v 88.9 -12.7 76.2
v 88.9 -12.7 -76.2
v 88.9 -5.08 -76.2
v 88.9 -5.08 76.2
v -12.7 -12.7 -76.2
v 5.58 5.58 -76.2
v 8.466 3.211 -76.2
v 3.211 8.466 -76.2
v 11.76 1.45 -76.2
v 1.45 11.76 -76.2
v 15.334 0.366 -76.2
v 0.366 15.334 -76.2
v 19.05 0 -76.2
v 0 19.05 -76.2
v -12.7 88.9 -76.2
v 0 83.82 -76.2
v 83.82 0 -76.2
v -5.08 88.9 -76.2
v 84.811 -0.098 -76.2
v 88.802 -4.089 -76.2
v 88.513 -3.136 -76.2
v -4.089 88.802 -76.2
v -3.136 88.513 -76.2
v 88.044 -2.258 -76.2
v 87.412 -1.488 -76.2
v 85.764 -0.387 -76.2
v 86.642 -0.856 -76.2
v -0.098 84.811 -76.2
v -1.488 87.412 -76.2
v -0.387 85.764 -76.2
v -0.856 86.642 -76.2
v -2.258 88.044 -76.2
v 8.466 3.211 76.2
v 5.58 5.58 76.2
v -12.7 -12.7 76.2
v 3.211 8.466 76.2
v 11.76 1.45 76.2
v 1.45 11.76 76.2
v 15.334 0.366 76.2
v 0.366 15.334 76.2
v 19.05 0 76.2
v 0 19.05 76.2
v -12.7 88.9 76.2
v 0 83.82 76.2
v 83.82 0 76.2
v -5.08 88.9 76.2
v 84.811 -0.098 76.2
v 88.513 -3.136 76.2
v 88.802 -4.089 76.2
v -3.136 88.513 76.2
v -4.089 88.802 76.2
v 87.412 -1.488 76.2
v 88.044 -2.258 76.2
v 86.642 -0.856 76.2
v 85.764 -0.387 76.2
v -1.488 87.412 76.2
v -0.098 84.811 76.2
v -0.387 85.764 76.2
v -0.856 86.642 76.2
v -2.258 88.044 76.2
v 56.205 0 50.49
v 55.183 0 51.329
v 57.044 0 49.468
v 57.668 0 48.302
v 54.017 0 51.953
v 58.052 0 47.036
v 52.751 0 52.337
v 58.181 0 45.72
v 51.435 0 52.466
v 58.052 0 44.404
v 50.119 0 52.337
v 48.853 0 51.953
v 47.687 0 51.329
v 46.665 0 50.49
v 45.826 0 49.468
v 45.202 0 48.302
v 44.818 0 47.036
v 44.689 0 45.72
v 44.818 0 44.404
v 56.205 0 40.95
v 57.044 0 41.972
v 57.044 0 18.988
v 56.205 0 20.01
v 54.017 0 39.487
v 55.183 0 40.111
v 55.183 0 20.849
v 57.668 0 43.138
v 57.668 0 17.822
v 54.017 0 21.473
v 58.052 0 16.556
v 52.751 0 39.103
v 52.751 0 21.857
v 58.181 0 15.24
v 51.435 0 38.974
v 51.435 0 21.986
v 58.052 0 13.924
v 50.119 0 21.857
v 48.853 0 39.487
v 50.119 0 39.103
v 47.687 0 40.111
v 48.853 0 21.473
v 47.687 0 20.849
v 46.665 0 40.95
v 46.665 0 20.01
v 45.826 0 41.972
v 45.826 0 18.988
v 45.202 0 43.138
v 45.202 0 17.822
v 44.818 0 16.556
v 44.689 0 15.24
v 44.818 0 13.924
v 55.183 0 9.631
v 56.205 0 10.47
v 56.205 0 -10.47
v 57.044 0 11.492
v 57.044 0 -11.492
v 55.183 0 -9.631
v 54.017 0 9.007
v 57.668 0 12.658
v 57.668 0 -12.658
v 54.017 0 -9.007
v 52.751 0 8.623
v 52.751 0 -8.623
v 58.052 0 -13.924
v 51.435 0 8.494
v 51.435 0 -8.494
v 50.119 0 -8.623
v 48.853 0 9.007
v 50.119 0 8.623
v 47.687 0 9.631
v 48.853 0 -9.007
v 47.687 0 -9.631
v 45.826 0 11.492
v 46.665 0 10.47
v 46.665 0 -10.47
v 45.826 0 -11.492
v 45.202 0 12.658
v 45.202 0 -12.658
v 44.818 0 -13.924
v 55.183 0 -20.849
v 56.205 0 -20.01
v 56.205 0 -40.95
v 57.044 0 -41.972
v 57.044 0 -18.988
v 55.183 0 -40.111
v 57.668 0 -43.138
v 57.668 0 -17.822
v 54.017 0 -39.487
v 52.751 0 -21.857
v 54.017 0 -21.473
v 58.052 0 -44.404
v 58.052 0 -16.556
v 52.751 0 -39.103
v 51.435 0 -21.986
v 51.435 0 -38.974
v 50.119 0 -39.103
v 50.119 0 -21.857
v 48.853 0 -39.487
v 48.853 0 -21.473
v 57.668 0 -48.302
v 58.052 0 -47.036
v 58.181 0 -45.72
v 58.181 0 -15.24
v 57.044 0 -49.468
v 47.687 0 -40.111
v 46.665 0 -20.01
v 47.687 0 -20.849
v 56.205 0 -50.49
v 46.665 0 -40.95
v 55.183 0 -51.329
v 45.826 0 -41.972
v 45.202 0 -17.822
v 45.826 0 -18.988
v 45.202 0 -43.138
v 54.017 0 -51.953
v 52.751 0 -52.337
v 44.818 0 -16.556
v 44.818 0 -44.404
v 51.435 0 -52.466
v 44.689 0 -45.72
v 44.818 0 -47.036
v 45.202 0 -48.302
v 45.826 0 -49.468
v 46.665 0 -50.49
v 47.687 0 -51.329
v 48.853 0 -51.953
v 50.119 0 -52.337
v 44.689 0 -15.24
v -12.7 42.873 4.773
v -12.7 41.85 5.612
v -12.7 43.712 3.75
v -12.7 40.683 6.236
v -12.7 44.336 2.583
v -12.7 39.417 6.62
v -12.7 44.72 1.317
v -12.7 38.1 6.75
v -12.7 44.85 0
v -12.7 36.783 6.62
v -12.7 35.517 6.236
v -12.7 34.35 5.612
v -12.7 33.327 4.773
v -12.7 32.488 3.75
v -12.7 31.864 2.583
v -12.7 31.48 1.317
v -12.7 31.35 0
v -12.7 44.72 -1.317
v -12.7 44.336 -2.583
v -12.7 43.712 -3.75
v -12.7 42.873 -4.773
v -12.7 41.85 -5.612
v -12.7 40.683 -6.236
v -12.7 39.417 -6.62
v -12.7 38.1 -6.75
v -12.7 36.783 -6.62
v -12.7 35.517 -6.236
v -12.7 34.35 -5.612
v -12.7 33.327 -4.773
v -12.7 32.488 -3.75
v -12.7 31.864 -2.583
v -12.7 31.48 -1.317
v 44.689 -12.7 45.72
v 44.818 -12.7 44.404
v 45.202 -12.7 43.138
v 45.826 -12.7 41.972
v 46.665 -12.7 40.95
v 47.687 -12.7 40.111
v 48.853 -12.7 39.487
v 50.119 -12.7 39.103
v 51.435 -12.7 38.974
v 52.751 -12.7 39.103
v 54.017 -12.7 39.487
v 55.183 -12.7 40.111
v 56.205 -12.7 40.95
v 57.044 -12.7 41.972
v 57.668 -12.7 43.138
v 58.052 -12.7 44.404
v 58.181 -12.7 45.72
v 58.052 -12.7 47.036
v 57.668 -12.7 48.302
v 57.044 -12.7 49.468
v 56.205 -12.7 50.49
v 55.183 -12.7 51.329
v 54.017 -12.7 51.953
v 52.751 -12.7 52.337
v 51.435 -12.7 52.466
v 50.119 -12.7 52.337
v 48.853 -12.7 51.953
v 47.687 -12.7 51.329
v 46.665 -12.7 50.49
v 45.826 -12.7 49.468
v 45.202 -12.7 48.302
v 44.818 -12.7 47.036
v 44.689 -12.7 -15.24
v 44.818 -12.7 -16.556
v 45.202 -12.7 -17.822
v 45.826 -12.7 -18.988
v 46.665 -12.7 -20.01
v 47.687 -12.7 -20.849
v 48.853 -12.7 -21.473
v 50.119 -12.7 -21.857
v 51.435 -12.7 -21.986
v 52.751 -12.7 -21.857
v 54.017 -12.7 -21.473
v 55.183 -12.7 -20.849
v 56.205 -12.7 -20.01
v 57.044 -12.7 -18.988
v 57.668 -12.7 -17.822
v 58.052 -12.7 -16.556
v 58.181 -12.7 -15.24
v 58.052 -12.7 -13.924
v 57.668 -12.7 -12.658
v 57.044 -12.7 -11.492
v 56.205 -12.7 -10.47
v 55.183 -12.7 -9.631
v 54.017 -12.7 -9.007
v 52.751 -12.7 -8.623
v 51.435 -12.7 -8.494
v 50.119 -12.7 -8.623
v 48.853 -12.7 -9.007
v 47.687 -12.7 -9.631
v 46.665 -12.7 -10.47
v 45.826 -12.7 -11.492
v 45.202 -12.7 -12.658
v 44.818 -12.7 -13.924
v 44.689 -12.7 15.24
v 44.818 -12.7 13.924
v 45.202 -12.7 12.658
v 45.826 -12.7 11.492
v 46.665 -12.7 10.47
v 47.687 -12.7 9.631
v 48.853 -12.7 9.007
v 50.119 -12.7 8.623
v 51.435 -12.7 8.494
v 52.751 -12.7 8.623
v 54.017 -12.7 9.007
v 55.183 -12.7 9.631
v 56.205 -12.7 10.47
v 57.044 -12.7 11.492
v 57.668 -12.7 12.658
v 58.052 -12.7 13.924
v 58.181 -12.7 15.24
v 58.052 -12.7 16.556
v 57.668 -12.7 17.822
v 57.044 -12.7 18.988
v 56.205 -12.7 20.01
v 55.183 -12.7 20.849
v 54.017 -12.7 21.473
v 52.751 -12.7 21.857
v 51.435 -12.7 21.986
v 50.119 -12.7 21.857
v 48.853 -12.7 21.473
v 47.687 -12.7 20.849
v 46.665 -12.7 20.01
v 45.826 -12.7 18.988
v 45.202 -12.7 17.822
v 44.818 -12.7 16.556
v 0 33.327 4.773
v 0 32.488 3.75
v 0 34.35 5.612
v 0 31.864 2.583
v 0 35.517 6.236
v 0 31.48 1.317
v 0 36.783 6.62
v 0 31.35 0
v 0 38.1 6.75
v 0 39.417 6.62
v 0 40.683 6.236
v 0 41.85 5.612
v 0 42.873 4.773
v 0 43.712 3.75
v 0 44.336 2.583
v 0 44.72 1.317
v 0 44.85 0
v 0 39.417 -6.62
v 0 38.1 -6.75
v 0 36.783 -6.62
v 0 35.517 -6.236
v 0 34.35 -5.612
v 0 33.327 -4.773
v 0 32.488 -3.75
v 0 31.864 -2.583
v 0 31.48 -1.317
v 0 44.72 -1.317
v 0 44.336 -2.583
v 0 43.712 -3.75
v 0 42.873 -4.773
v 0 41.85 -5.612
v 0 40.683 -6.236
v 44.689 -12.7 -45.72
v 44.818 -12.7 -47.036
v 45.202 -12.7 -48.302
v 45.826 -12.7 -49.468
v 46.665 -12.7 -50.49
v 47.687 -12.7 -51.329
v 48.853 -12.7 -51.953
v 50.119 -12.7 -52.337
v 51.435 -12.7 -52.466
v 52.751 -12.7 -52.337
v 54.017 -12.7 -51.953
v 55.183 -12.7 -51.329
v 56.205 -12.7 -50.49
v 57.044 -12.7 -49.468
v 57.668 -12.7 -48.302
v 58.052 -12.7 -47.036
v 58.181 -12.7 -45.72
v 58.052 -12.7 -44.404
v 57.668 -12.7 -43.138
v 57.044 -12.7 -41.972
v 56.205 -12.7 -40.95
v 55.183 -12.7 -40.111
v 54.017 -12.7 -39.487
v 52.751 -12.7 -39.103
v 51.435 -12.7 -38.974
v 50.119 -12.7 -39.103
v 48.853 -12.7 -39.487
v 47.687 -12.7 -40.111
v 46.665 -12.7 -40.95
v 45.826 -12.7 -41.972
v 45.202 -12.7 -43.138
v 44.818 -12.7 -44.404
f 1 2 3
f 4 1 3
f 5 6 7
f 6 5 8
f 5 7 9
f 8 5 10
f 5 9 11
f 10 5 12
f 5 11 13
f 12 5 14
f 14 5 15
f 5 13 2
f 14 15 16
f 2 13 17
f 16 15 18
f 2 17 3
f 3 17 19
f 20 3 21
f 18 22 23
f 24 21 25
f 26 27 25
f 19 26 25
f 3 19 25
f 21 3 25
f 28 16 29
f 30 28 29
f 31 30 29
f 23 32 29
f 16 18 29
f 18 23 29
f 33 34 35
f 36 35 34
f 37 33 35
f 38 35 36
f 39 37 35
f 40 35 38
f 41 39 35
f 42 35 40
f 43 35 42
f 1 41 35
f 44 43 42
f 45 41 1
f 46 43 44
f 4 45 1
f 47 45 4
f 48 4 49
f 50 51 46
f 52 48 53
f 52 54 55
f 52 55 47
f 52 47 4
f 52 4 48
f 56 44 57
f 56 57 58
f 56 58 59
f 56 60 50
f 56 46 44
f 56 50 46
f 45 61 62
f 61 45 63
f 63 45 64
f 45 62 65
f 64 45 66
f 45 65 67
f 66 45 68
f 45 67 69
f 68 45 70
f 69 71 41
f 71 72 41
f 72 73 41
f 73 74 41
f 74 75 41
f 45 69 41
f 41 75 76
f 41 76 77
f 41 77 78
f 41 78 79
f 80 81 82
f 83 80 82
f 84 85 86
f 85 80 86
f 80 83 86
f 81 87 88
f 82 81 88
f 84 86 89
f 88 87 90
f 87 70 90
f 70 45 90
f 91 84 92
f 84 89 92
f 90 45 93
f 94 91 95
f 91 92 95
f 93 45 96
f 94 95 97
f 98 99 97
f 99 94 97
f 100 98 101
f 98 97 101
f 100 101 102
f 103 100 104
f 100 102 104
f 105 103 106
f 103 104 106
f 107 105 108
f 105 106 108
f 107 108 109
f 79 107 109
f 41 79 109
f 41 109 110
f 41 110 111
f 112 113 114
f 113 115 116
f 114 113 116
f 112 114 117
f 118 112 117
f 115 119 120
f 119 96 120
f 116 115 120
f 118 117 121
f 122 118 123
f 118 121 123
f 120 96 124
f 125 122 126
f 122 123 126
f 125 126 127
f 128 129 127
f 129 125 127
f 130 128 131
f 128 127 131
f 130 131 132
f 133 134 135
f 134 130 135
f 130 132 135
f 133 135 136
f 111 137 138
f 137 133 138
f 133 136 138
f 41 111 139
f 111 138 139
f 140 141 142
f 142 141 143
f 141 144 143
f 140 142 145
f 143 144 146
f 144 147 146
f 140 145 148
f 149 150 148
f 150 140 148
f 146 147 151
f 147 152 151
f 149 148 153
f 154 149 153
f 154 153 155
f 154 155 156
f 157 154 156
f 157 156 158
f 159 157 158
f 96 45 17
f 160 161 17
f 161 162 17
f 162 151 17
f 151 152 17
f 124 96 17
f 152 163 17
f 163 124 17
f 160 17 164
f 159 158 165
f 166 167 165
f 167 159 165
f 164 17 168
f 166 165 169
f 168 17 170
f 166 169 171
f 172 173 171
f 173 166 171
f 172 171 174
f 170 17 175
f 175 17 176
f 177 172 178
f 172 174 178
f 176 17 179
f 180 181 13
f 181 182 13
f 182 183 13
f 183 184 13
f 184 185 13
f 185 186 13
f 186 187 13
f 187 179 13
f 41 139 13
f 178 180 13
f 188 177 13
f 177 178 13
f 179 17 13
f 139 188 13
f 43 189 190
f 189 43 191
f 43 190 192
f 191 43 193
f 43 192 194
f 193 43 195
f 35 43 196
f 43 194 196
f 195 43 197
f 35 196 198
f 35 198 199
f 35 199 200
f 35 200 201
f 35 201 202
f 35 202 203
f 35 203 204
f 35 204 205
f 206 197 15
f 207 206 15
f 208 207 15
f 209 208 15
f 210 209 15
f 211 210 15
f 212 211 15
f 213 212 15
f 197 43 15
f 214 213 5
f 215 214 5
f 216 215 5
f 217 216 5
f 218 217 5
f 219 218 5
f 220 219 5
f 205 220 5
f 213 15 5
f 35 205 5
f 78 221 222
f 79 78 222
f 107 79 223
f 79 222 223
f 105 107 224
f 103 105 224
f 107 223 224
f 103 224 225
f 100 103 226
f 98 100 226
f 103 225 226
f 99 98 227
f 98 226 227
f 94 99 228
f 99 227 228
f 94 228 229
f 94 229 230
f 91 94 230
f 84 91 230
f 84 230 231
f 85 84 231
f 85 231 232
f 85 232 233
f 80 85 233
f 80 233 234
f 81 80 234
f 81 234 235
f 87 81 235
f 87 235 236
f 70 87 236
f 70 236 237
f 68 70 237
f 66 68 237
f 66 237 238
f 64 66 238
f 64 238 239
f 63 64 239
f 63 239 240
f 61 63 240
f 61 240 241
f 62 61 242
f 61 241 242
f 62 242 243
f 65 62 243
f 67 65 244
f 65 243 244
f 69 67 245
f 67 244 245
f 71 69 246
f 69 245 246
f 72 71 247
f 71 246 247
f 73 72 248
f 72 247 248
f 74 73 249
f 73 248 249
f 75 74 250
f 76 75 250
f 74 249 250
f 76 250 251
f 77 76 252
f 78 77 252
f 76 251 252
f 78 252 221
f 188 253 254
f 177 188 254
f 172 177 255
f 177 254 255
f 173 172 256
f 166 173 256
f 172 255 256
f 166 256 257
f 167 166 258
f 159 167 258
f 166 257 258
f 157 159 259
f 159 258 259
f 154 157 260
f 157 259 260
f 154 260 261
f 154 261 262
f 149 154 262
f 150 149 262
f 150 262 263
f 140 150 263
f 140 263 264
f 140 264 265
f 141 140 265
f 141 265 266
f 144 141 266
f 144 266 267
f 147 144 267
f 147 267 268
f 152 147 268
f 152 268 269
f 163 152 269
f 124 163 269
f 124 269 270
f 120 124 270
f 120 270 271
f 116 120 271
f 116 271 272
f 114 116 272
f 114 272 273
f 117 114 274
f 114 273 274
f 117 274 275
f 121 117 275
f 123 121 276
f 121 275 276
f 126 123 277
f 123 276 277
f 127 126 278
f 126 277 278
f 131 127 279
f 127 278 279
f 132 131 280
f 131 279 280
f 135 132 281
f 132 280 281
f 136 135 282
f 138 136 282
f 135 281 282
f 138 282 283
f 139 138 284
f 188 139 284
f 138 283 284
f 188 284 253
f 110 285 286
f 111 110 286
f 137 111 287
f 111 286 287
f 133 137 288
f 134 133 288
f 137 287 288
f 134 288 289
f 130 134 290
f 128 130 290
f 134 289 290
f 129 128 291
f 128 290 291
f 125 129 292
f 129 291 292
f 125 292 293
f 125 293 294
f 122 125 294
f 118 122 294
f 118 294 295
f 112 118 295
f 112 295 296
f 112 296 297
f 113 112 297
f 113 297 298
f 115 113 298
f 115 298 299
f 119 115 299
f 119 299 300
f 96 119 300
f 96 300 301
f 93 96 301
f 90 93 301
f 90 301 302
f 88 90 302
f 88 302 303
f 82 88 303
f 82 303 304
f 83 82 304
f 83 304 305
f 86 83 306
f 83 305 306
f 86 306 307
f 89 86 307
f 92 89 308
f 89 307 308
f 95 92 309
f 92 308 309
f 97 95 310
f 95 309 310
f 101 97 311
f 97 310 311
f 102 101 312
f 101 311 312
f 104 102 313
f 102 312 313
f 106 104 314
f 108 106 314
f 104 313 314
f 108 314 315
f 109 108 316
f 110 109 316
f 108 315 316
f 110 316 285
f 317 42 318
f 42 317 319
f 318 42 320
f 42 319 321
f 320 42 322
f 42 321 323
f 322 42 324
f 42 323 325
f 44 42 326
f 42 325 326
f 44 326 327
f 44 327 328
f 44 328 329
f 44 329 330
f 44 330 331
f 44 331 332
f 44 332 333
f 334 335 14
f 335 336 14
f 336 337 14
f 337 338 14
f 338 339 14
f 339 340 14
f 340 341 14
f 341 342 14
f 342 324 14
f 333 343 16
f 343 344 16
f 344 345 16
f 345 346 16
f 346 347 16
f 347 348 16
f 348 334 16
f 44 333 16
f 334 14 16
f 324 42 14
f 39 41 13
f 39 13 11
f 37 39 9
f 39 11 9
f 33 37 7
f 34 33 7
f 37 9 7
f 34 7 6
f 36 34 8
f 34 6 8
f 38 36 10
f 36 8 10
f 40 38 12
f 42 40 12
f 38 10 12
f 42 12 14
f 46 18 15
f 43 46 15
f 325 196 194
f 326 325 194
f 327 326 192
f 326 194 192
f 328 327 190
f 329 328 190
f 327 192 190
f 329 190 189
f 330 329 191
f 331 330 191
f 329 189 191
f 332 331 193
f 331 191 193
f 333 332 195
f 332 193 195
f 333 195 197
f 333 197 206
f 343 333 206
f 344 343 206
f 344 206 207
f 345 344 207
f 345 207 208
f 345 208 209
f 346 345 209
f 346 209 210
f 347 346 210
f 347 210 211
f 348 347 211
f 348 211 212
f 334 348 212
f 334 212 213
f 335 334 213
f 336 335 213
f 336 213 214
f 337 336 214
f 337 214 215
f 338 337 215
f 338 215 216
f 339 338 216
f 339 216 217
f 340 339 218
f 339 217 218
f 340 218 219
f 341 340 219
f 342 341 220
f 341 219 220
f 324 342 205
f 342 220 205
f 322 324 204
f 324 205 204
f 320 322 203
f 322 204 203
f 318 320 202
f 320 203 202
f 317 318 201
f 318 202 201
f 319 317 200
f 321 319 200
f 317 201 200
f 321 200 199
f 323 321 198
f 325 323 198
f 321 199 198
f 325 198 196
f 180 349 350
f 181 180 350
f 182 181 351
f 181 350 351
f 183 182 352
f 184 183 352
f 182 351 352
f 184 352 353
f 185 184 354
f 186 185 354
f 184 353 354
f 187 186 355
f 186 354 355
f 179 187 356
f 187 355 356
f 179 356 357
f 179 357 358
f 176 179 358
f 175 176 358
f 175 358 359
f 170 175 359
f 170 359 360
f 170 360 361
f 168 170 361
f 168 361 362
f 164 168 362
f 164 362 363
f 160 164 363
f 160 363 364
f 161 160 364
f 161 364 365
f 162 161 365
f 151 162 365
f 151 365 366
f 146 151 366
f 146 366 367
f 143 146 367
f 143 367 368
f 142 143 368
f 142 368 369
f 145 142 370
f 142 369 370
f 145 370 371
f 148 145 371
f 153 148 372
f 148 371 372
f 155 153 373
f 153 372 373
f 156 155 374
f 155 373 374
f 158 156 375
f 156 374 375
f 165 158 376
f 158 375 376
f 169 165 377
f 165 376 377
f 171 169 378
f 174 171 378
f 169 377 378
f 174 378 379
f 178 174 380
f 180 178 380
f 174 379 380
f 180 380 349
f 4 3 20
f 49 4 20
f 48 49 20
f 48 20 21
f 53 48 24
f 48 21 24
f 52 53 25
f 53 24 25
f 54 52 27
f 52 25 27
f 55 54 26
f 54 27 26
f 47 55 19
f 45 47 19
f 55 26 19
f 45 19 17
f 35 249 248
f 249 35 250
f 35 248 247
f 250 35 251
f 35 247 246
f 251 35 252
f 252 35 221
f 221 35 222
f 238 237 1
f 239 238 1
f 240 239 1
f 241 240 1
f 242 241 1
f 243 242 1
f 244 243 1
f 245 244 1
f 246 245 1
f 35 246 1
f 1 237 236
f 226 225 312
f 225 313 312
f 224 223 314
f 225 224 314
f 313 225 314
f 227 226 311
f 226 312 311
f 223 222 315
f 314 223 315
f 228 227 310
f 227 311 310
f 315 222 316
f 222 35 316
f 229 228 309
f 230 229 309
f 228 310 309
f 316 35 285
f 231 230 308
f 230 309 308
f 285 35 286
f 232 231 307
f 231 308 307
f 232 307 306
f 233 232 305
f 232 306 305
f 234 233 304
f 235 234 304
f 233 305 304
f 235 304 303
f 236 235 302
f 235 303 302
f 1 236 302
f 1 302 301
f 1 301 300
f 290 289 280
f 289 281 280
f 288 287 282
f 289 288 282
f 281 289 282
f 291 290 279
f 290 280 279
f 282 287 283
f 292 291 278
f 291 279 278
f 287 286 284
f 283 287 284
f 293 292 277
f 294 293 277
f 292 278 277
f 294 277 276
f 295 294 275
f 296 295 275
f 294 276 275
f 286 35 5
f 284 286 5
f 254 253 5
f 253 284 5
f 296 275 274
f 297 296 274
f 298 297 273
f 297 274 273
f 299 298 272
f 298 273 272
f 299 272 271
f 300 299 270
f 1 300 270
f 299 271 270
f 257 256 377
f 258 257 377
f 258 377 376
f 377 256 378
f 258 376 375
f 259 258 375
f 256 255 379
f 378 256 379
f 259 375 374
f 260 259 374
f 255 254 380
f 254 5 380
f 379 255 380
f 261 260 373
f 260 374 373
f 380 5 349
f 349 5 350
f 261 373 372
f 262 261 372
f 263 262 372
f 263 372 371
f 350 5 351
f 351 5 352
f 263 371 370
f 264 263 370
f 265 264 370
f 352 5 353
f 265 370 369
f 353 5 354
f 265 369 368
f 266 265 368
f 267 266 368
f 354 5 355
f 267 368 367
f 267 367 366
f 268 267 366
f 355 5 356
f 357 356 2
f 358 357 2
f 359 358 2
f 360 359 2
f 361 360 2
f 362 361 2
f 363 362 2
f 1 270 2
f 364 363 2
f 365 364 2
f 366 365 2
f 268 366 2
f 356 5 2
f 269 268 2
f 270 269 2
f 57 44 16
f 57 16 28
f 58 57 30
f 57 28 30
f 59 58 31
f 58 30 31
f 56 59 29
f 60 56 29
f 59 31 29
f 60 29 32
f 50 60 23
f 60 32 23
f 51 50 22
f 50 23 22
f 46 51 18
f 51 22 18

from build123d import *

# Parameters (mm, degrees)
BOSS_EXTRUDE1_DEPTH      = 76.2
BOSS_EXTRUDE1_DEPTH_BACK = 76.2
M12_CLEARANCE_HOLE1_D    = 13.5
F_1_2_CLEARANCE_HOLE1_D  = 13.49248


with BuildPart() as part:
    # Sketch3 → Boss-Extrude1 (new, two sides: drawn at the far end of the back side and taken through both)
    with BuildSketch(Plane.XY.offset(-BOSS_EXTRUDE1_DEPTH_BACK)):
        with BuildLine():
            Line((0, 19.05), (0, 83.82))
            ThreePointArc((0, 83.82), (-1.487897552, 87.412102448), (-5.08, 88.9))
            Line((-5.08, 88.9), (-12.7, 88.9))
            Line((-12.7, 88.9), (-12.7, -12.7))
            Line((-12.7, -12.7), (88.9, -12.7))
            Line((88.9, -12.7), (88.9, -5.08))
            ThreePointArc((88.9, -5.08), (87.412102448, -1.487897552), (83.82, 0))
            Line((83.82, 0), (19.05, 0))
            ThreePointArc((19.05, 0), (5.579615818, 5.579615818), (0, 19.05))
        make_face()
    extrude(amount=BOSS_EXTRUDE1_DEPTH + BOSS_EXTRUDE1_DEPTH_BACK)

    # M12 Clearance Hole1 (through all)
    with Locations(Plane(origin=(0, 0, 0), x_dir=(0, 0, -1), z_dir=(1, 0, 0))):
        with Locations((0, 38.1)):
            Hole(M12_CLEARANCE_HOLE1_D / 2)

    # 1/2 Clearance Hole1 (through all)
    with Locations(Plane(origin=(0, 0, 0), x_dir=(1, 0, 0), z_dir=(0, 1, 0))):
        with Locations((51.435, -45.72), (51.435, 45.72), (51.435, 15.24), (51.435, -15.24)):
            Hole(F_1_2_CLEARANCE_HOLE1_D / 2)


solid = part.part
